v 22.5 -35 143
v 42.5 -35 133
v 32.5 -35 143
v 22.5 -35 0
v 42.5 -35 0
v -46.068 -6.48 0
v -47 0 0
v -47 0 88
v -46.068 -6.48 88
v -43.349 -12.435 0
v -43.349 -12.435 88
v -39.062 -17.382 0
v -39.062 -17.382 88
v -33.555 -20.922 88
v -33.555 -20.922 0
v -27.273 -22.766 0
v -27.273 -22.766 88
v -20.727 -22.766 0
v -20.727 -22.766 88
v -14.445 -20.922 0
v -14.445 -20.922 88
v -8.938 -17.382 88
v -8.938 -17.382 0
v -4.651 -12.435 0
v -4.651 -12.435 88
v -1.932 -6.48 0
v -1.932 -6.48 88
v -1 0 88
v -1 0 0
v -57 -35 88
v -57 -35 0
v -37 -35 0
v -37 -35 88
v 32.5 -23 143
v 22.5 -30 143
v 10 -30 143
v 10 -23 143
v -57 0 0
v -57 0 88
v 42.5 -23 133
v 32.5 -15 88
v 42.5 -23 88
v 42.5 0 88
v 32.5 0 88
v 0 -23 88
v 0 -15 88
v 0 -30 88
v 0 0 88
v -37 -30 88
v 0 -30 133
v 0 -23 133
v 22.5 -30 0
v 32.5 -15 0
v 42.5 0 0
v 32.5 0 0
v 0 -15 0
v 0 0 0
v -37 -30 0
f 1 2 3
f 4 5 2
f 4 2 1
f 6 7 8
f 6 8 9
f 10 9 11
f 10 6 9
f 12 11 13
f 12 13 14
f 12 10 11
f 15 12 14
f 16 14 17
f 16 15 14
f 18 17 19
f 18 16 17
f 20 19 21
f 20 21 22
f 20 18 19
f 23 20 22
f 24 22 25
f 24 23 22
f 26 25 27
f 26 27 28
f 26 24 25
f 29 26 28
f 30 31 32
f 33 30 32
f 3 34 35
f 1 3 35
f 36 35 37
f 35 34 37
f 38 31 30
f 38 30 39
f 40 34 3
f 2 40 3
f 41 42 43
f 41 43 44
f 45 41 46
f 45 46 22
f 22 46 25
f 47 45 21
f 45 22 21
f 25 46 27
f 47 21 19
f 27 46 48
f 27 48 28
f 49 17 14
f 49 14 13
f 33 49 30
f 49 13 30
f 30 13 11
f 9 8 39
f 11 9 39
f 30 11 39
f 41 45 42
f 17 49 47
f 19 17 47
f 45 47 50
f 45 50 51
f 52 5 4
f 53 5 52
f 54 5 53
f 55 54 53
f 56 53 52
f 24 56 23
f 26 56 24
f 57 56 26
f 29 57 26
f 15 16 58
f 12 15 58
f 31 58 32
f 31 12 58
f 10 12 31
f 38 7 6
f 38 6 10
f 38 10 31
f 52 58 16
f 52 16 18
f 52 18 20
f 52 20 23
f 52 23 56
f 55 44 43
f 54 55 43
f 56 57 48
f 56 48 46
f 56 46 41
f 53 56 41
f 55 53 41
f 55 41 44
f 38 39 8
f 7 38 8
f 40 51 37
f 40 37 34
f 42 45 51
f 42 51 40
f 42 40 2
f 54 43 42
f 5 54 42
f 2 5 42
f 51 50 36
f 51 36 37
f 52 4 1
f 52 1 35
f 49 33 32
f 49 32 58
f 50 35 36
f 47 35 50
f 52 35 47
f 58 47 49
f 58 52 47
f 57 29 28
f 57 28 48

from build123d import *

# Parameters (mm, degrees)
PAD_DEPTH    = 88
PAD001_DEPTH = 55
CHAMFER_SIZE = 10


with BuildPart() as part:
    # Sketch → Pad (new body)
    with BuildSketch(Plane.XY):
        with BuildLine():
            ThreePointArc((-47, 0), (-24, -23), (-1, 0))
            Line((-1, 0), (0, 0))
            Line((0, 0), (0, -15))
            Line((0, -15), (32.5, -15))
            Line((32.5, -15), (32.5, 0))
            Line((32.5, 0), (42.5, 0))
            Line((42.5, 0), (42.5, -35))
            Line((22.5, -35), (42.5, -35))
            Line((22.5, -30), (22.5, -35))
            Line((-37, -30), (22.5, -30))
            Line((-37, -35), (-37, -30))
            Line((-57, -35), (-37, -35))
            Line((-57, -35), (-57, 0))
            Line((-57, 0), (-47, 0))
        make_face()
    extrude(amount=PAD_DEPTH)

    # Sketch001 (on Face16 of Pad) → Pad001 (join)
    with BuildSketch(Plane.XY.offset(88)):
        Polygon((0, -23), (42.5, -23), (42.5, -35), (22.5, -35), (22.5, -30), (0, -30), align=None)
    extrude(amount=PAD001_DEPTH)

    # Chamfer
    chamfer_edges = [part.edges().sort_by_distance(p)[0] for p in [
        (0, -26.5, 143),
        (42.5, -29, 143),
    ]]
    chamfer(chamfer_edges, length=CHAMFER_SIZE)


solid = part.part
